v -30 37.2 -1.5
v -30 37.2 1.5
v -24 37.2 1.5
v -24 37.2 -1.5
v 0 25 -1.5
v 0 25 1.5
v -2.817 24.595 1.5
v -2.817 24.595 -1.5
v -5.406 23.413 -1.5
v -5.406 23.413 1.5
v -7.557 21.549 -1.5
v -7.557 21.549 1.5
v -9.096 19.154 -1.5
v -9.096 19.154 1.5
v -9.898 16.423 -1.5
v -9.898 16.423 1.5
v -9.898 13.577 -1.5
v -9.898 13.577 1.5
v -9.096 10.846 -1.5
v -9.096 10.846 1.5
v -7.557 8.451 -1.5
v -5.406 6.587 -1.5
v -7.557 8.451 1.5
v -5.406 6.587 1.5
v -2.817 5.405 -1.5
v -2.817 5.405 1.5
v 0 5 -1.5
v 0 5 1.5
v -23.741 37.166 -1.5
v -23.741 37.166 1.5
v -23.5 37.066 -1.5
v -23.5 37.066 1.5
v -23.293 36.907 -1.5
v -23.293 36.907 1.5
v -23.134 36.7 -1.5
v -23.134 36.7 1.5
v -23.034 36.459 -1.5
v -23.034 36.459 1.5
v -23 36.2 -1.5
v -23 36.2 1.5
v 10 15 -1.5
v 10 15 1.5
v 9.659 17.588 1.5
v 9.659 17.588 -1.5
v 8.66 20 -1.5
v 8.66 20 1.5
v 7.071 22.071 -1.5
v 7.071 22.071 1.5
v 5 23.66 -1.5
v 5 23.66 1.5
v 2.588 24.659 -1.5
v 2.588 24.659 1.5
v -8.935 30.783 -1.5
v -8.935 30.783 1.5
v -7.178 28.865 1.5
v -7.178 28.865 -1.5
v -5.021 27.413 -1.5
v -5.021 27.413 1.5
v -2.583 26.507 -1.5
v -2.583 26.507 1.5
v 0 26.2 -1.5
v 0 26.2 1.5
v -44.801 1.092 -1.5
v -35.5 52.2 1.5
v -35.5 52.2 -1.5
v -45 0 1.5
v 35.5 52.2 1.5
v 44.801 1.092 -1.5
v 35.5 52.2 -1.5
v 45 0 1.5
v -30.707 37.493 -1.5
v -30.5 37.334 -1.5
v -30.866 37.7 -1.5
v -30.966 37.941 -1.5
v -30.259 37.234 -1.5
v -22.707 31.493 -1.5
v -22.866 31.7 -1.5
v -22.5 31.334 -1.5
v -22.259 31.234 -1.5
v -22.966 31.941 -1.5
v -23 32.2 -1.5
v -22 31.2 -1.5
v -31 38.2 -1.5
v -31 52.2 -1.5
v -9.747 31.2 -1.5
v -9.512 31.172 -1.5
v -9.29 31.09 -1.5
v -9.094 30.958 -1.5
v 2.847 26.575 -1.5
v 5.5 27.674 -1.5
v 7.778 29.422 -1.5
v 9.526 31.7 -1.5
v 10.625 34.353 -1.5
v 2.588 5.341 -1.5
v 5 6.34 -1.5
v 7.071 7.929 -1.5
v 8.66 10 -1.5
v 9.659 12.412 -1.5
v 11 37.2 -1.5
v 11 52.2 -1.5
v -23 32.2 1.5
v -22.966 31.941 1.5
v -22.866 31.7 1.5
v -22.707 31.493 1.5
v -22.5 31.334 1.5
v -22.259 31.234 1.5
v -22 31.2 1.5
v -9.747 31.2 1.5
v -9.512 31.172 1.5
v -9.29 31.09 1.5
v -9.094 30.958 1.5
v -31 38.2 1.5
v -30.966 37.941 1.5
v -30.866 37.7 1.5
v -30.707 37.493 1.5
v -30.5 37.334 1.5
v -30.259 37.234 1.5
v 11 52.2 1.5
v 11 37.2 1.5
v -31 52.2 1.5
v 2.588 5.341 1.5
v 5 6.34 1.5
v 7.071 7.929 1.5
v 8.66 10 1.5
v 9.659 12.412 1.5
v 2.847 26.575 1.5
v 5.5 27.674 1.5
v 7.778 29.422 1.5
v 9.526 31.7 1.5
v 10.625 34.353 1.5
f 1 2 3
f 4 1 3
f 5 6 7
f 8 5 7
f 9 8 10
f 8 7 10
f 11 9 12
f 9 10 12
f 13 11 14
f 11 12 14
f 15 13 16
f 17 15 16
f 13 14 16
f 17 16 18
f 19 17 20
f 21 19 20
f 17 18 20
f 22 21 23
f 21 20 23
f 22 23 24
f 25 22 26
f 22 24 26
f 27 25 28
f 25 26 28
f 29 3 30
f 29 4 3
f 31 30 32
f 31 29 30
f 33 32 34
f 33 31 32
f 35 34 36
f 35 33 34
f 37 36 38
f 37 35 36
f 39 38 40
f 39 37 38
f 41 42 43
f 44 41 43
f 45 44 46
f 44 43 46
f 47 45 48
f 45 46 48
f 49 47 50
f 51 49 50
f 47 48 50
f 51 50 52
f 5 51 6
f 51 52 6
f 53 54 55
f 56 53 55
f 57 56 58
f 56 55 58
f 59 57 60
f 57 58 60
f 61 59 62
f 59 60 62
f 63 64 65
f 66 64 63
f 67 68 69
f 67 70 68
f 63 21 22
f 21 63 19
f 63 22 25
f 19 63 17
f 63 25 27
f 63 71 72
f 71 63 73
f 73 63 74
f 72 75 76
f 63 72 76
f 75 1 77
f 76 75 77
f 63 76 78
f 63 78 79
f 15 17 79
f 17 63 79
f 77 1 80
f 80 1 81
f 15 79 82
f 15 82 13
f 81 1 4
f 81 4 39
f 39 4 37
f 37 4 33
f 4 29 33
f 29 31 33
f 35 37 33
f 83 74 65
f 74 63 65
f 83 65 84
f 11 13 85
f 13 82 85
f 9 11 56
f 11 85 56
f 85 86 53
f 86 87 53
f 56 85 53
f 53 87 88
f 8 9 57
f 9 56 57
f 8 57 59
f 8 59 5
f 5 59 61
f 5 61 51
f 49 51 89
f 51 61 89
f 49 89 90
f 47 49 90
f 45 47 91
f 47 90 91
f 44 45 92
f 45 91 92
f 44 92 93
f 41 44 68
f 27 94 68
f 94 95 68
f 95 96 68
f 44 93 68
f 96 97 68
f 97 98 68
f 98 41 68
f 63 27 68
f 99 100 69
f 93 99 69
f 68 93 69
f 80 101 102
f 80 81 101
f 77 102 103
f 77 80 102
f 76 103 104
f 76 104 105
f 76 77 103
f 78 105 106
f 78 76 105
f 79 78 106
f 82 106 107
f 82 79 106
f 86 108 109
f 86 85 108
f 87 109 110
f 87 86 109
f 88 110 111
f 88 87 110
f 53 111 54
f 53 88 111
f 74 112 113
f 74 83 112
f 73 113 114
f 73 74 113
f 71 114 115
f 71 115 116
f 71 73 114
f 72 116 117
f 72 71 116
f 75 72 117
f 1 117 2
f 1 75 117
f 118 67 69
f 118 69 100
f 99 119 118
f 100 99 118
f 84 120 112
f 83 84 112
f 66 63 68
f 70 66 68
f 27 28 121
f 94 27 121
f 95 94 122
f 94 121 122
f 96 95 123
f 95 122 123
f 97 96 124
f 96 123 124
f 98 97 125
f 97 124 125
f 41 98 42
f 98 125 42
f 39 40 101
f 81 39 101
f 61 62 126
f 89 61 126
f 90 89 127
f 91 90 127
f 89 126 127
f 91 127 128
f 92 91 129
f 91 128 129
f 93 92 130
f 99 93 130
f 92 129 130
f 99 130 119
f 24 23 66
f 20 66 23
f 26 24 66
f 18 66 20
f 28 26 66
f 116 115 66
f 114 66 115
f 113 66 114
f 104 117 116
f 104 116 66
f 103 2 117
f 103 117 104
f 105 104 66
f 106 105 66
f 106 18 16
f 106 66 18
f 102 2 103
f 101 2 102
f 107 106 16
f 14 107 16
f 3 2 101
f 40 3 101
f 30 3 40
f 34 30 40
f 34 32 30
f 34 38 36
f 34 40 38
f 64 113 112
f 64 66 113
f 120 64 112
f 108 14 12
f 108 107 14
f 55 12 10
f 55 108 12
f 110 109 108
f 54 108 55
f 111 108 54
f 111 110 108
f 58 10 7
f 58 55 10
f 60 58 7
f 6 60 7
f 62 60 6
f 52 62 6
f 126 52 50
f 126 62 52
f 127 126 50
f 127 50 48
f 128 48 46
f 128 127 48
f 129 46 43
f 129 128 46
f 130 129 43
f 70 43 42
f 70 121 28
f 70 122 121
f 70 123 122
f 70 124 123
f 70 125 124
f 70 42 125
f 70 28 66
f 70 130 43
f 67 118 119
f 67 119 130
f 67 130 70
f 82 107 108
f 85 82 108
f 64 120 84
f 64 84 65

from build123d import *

# Parameters (mm, degrees)
BOSS_EXTRUDE1_DEPTH = 1.5
CHAMFER1_SIZE2      = 1.091910703
CHAMFER1_SIZE       = 3
CUT_EXTRUDE1_DEPTH  = 69.98434605
FILLET1_R           = 1


with BuildPart() as part:
    # Sketch1 → Boss-Extrude1 (new, symmetric)
    with BuildSketch(Plane.XY):
        Polygon((-45, 0), (45, 0), (35.5, 52.2), (-35.5, 52.2), align=None)
    extrude(amount=BOSS_EXTRUDE1_DEPTH, both=True)

    # Chamfer1
    chamfer1_edges = [part.edges().sort_by_distance(p)[0] for p in [
        (0, 0, -1.5),
    ]]
    chamfer1_side = [part.faces().sort_by_distance(p)[0] for p in [
        (0, 0, -1.478161786),
    ]]
    chamfer(chamfer1_edges, length=CHAMFER1_SIZE - 0.0001, length2=CHAMFER1_SIZE2 - 0.0001, reference=chamfer1_side[0])  # a hair under: the kernel refuses the full size

    # Sketch2 → Cut-Extrude1 (cut, through all)
    with BuildSketch(Plane.XY.offset(1.5)):
        Polygon((-11, 37.2), (-11, 52.2), (-31, 52.2), (-31, 37.2), (-23, 37.2), align=None)
        with BuildLine():
            ThreePointArc((-9.219544457, 31.2), (-5.244044241, 27.530460197), (0, 26.2))
            Line((0, 26.2), (0, 52.2))
            Line((0, 52.2), (-11, 52.2))
            Line((-11, 52.2), (-11, 37.2))
            ThreePointArc((-11, 37.2), (-10.545496409, 34.070702078), (-9.219544457, 31.2))
        make_face()
        with BuildLine():
            Line((0, 52.2), (0, 26.2))
            ThreePointArc((0, 26.2), (7.778174593, 29.421825407), (11, 37.2))
            Line((11, 37.2), (11, 52.2))
            Line((11, 52.2), (0, 52.2))
        make_face()
        with BuildLine():
            ThreePointArc((0, 25), (-10, 15), (0, 5))
            Line((0, 5), (0, 25))
        make_face()
        with BuildLine():
            Line((0, 25), (0, 5))
            ThreePointArc((0, 5), (7.071067812, 7.928932188), (10, 15))
            ThreePointArc((10, 15), (7.071067812, 22.071067812), (0, 25))
        make_face()
        with BuildLine():
            Line((-23, 31.2), (-9.219544457, 31.2))
            ThreePointArc((-9.219544457, 31.2), (-10.545496409, 34.070702078), (-11, 37.2))
            Line((-11, 37.2), (-23, 37.2))
            Line((-23, 37.2), (-23, 31.2))
        make_face()
    extrude(amount=-CUT_EXTRUDE1_DEPTH, mode=Mode.SUBTRACT)

    # Fillet1
    fillet1_edges = [part.edges().sort_by_distance(p)[0] for p in [
        (-9.219544457, 31.2, 0),
        (-23, 31.2, 0),
        (-23, 37.2, 0),
        (-31, 37.2, 0),
    ]]
    fillet(fillet1_edges, radius=FILLET1_R)


solid = part.part
